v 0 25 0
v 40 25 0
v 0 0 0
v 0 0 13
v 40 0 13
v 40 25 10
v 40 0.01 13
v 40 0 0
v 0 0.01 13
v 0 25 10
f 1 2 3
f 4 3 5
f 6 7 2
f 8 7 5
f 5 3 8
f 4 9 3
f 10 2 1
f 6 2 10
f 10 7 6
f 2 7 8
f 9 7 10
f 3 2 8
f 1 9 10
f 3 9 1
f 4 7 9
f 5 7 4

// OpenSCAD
wedge_width = 40;
wedge_length = 25;

wegde_height1 = 10;
wedge_height2 = 13;

hull() {
    cube([wedge_width, wedge_length, wegde_height1]);
    cube([wedge_width, 0.01, wedge_height2]);
}
